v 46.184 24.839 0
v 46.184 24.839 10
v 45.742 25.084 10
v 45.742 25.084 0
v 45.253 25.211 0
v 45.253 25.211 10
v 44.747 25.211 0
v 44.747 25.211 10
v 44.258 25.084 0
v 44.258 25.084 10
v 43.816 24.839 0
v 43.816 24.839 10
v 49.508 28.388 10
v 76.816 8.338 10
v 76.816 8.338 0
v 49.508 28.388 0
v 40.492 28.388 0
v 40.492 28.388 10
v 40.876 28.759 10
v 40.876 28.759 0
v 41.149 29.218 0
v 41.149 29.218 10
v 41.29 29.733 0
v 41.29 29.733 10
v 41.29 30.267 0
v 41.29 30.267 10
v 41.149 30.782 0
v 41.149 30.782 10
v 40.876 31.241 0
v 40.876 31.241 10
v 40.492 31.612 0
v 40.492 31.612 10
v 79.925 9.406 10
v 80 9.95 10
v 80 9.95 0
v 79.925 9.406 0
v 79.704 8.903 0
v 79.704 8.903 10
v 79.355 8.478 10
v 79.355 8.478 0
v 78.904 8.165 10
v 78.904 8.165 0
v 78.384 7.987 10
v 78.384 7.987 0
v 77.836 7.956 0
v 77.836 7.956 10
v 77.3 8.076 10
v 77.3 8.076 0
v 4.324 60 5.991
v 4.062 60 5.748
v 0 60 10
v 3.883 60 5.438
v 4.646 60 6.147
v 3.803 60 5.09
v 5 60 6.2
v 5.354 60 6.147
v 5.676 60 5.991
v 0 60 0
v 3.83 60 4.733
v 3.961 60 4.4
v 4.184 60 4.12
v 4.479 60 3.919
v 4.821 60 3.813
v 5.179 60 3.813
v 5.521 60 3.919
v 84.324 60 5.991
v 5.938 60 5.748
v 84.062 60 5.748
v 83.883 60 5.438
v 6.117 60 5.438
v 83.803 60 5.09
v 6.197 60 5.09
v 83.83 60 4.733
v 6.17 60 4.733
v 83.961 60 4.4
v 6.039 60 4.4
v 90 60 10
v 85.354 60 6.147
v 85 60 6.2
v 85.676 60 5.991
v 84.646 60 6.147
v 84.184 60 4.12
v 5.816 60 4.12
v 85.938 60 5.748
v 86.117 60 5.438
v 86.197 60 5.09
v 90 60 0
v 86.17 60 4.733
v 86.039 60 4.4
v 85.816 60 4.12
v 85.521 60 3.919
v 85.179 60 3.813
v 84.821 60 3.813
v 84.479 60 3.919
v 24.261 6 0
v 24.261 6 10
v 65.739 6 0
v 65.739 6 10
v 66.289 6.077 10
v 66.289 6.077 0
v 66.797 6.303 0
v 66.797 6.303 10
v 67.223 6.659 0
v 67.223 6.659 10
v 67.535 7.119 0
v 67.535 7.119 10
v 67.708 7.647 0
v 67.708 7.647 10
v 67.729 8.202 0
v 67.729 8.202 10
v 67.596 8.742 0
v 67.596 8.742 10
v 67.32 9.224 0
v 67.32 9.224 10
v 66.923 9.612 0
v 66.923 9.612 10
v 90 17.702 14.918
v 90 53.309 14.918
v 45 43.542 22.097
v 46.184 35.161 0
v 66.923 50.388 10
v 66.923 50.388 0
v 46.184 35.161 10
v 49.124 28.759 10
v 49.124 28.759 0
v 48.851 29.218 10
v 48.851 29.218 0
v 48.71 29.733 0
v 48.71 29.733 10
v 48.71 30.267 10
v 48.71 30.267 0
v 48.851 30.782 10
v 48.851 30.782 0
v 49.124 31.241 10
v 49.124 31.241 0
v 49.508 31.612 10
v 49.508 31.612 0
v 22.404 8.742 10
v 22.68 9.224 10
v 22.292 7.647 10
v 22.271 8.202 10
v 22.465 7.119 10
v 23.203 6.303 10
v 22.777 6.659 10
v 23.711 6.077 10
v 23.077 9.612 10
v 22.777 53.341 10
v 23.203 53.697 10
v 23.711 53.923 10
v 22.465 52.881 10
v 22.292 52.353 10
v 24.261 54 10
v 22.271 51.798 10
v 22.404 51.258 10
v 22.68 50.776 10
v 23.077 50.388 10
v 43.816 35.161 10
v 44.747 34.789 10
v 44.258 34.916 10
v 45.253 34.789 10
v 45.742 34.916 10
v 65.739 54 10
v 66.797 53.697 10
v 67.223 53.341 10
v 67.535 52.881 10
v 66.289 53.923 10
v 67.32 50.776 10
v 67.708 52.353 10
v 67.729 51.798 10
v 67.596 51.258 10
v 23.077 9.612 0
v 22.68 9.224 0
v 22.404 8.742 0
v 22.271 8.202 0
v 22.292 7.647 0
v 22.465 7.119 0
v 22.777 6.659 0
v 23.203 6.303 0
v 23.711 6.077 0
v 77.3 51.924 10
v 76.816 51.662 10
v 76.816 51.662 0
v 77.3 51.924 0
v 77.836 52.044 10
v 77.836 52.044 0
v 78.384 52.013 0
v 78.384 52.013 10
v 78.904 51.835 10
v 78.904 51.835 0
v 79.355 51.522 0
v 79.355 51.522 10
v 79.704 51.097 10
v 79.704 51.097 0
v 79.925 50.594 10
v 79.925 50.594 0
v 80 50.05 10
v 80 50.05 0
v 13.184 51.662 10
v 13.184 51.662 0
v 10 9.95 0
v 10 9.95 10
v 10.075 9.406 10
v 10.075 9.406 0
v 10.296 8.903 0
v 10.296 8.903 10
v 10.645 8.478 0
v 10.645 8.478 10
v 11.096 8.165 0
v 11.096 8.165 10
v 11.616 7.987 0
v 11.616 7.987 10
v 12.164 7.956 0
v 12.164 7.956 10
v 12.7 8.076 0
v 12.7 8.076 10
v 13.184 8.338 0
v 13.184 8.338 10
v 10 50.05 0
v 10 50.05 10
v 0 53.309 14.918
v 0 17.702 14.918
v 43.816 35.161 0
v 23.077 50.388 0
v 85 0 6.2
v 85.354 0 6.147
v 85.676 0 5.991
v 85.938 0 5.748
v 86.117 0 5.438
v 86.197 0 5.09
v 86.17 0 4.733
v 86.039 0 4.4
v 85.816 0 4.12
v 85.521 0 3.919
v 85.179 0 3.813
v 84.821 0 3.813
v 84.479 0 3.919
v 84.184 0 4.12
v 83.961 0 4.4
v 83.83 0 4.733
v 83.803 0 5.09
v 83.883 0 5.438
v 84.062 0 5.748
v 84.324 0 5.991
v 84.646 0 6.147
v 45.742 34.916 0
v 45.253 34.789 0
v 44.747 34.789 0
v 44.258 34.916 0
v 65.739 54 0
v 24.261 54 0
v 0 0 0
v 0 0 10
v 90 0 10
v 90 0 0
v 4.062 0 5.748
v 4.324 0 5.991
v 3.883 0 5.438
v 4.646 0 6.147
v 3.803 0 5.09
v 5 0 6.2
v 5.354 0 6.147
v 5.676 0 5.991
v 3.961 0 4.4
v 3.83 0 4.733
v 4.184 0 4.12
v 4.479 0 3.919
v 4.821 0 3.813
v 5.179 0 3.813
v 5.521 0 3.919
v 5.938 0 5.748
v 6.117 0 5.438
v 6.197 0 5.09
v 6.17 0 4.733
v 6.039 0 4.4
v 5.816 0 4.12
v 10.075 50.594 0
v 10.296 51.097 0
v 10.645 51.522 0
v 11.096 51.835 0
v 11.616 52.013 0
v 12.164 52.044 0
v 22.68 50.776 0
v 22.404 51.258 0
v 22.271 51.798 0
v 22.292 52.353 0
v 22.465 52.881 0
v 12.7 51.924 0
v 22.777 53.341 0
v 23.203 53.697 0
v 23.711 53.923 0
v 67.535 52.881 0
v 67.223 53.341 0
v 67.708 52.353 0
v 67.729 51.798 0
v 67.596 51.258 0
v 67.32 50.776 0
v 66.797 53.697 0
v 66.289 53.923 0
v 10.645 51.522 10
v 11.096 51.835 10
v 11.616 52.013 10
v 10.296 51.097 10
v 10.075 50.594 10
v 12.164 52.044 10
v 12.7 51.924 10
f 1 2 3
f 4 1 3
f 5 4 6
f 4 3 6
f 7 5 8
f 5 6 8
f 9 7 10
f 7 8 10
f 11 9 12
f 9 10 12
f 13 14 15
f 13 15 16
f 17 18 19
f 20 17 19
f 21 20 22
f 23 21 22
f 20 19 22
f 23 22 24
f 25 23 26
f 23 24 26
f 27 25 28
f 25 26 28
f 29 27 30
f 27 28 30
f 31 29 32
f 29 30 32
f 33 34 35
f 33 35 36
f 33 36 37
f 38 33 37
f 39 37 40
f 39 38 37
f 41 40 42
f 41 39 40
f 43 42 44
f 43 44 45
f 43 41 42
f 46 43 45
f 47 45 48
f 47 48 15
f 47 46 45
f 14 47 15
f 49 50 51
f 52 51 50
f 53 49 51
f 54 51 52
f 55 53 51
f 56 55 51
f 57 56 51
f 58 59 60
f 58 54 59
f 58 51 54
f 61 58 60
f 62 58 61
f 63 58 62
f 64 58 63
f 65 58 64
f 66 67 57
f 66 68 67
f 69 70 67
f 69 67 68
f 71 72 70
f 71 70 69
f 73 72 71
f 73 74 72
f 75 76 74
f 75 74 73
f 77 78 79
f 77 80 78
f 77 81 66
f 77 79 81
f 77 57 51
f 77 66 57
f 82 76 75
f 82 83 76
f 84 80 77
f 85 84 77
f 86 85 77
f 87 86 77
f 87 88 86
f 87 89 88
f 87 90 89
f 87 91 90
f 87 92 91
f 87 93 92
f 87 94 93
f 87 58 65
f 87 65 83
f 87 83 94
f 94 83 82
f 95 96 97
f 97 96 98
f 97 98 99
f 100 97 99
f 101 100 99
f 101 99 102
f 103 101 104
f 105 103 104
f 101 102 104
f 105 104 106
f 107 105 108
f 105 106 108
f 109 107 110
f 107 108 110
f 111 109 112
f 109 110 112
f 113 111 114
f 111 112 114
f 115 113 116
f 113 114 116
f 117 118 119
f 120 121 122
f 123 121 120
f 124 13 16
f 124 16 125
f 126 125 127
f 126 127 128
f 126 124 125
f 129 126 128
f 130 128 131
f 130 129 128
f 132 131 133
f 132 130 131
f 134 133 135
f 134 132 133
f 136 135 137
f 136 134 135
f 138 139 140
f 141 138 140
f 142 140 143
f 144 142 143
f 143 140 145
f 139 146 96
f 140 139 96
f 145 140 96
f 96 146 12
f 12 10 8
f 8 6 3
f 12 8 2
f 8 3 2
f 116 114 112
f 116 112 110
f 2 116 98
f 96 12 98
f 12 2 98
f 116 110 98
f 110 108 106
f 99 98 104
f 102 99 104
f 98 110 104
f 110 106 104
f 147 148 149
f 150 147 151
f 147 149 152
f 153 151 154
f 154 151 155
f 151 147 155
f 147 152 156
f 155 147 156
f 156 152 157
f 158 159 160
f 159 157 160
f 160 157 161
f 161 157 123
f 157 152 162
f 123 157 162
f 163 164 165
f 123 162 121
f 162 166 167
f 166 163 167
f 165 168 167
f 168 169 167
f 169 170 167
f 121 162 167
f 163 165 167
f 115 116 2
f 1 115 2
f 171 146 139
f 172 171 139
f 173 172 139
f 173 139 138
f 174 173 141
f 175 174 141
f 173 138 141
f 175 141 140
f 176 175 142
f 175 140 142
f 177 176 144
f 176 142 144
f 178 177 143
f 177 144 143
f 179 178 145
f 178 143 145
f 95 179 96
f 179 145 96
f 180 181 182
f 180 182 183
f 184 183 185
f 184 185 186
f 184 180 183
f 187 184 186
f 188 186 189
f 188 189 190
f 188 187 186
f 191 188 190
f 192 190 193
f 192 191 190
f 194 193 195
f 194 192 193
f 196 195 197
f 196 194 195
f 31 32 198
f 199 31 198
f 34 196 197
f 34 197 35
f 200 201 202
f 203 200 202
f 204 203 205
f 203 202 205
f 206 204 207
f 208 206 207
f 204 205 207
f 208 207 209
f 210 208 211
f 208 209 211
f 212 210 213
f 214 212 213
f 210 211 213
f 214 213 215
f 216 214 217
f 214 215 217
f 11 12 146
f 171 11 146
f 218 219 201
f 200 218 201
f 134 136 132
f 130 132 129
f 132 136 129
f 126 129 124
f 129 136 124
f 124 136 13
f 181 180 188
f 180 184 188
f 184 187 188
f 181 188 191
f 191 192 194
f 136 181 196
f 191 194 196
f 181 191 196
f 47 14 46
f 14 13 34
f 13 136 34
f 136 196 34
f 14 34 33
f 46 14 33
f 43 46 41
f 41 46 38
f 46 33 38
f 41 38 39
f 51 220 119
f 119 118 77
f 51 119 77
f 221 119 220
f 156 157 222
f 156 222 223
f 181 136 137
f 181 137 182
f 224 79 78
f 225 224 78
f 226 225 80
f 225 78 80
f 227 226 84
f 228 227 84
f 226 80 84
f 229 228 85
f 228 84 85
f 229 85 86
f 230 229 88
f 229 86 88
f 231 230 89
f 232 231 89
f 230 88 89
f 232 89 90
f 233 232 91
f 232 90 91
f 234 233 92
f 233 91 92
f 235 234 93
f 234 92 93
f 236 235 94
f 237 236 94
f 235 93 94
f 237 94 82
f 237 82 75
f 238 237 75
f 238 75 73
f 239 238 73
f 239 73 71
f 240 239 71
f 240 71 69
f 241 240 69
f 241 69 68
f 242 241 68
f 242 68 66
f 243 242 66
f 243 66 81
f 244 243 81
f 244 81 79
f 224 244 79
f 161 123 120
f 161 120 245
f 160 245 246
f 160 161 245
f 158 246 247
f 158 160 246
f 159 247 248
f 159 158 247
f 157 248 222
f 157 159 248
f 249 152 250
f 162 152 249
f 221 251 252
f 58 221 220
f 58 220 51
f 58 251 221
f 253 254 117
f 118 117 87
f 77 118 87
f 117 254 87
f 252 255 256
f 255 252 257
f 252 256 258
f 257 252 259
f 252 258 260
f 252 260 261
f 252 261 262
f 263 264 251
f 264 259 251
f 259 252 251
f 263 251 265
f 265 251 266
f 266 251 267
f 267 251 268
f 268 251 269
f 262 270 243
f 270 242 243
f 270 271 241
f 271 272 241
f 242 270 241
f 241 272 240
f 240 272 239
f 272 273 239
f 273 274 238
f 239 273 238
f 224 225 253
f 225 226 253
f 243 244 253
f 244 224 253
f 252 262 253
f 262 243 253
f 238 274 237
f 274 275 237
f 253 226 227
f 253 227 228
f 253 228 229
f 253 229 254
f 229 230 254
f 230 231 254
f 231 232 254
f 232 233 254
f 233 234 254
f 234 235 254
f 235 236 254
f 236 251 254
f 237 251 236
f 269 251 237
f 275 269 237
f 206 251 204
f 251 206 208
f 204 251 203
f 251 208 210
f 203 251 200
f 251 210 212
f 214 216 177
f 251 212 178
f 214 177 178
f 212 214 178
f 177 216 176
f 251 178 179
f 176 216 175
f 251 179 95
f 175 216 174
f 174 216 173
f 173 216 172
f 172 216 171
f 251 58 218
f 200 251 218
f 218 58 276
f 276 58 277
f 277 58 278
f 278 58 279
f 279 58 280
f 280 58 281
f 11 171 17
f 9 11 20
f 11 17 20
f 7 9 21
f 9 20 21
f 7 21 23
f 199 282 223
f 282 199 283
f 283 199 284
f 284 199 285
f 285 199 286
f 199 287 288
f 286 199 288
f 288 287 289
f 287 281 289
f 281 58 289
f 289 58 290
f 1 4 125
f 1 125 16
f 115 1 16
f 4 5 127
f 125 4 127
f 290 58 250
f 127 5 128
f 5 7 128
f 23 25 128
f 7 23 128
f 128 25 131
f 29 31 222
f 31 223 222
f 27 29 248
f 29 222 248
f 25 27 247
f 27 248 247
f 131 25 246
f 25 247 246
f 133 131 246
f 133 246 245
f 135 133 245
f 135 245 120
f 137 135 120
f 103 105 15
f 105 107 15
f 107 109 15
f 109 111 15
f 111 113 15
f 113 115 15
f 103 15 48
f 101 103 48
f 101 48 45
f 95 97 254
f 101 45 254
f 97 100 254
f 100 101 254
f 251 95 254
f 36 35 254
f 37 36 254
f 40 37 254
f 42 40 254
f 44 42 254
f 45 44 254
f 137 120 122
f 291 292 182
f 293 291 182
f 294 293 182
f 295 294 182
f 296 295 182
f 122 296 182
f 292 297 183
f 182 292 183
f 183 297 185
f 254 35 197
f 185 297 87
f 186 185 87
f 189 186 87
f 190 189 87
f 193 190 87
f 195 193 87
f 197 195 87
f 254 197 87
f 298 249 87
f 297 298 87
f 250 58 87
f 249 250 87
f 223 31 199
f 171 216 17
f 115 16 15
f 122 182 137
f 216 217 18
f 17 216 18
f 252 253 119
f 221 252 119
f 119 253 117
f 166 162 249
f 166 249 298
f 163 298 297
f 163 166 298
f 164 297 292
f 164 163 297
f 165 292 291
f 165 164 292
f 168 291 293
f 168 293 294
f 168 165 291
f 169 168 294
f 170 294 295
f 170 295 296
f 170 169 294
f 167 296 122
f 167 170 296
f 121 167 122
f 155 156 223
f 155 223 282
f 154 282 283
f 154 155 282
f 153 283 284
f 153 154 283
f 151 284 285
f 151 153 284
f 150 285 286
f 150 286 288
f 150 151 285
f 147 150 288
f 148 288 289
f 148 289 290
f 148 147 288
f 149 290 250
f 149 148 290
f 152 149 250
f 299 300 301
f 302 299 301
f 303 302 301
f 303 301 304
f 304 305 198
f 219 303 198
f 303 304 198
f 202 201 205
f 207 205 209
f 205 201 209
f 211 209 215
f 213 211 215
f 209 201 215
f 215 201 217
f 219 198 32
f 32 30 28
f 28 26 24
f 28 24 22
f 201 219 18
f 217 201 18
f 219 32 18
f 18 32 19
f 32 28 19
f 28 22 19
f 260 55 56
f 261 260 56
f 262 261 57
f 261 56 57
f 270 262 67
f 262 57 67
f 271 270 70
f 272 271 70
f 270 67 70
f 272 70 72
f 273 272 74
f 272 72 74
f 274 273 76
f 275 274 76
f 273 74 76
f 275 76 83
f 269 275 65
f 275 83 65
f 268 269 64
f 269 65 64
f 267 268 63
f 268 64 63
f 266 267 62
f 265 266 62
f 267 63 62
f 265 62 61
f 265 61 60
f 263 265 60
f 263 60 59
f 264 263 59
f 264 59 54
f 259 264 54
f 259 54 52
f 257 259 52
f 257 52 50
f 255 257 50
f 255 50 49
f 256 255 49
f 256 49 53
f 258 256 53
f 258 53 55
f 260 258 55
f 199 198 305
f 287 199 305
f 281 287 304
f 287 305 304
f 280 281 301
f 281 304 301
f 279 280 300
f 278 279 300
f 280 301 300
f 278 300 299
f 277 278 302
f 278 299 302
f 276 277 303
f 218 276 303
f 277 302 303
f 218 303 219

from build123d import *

# Parameters (mm, degrees)
SKIZZE1_W                       = 90
SKIZZE1_H                       = 60
AUFSATZ_LINEAR_AUSTRAGEN1_DEPTH = 10
SCHNITT_LINEAR_AUSTRAGEN1_DEPTH = 10
SKIZZE3_R                       = 1.2
SCHNITT_LINEAR_AUSTRAGEN2_DEPTH = 68
AUFSATZ_LINEAR_AUSTRAGEN2_DEPTH = 90
SCHNITT_LINEAR_AUSTRAGEN4_DEPTH = 90


with BuildPart() as part:
    # Skizze1 → Aufsatz-Linear austragen1 (new body)
    with BuildSketch(Plane.XY):
        with Locations((45, 30)):
            Rectangle(SKIZZE1_W, SKIZZE1_H)
    extrude(amount=AUFSATZ_LINEAR_AUSTRAGEN1_DEPTH)

    # Skizze2 → Schnitt-Linear austragen1 (cut)
    with BuildSketch(Plane.XY.offset(10)):
        with BuildLine():
            Line((10, 50.05034464), (10, 9.94965536))
            ThreePointArc((10, 9.94965536), (11.096486968, 8.165372815), (13.183664201, 8.337532828))
            Line((13.183664201, 8.337532828), (40.491757454, 28.387877468))
            ThreePointArc((40.491757454, 28.387877468), (41.308093253, 30), (40.491757454, 31.612122532))
            Line((40.491757454, 31.612122532), (13.183664201, 51.662467172))
            ThreePointArc((13.183664201, 51.662467172), (11.096486968, 51.834627185), (10, 50.05034464))
        make_face()
        with BuildLine():
            Line((43.816335799, 35.160742066), (23.07733899, 50.387877468))
            ThreePointArc((23.07733899, 50.387877468), (22.360444711, 52.622798095), (24.261003191, 54))
            Line((24.261003191, 54), (65.738996809, 54))
            ThreePointArc((65.738996809, 54), (67.639555289, 52.622798095), (66.92266101, 50.387877468))
            Line((66.92266101, 50.387877468), (46.183664201, 35.160742066))
            ThreePointArc((46.183664201, 35.160742066), (45, 34.772864599), (43.816335799, 35.160742066))
        make_face()
        with BuildLine():
            Line((24.261003191, 6), (65.738996809, 6))
            ThreePointArc((65.738996809, 6), (67.639555289, 7.377201905), (66.92266101, 9.612122532))
            Line((66.92266101, 9.612122532), (46.183664201, 24.839257934))
            ThreePointArc((46.183664201, 24.839257934), (45, 25.227135401), (43.816335799, 24.839257934))
            Line((43.816335799, 24.839257934), (23.07733899, 9.612122532))
            ThreePointArc((23.07733899, 9.612122532), (22.360444711, 7.377201905), (24.261003191, 6))
        make_face()
        with BuildLine():
            Line((80, 50.05034464), (80, 9.94965536))
            ThreePointArc((80, 9.94965536), (78.903513032, 8.165372815), (76.816335799, 8.337532828))
            Line((76.816335799, 8.337532828), (49.508242546, 28.387877468))
            ThreePointArc((49.508242546, 28.387877468), (48.691906747, 30), (49.508242546, 31.612122532))
            Line((49.508242546, 31.612122532), (76.816335799, 51.662467172))
            ThreePointArc((76.816335799, 51.662467172), (78.903513032, 51.834627185), (80, 50.05034464))
        make_face()
    extrude(amount=-SCHNITT_LINEAR_AUSTRAGEN1_DEPTH, mode=Mode.SUBTRACT)

    # Skizze3 → Schnitt-Linear austragen2 (cut)
    with BuildSketch(Plane(origin=(0, 60, 0), x_dir=(1, 0, 0), z_dir=(0, 1, 0))):
        with Locations(Location((5, -5, 0), (0, 0, 270))):
            Circle(SKIZZE3_R)
        with Locations(Location((85, -5, 0), (0, 0, 270))):
            Circle(SKIZZE3_R)
    extrude(amount=-SCHNITT_LINEAR_AUSTRAGEN2_DEPTH, mode=Mode.SUBTRACT)

    # Skizze4 → Aufsatz-Linear austragen2 (add)
    with BuildSketch(Plane(origin=(90, 0, 0), x_dir=(0, 0, -1), z_dir=(1, 0, 0))):
        Polygon((-10, 60), (-10, 0), (-22.096946665, 43.542338596), align=None)
    extrude(amount=-AUFSATZ_LINEAR_AUSTRAGEN2_DEPTH)

    # Skizze5 → Schnitt-Linear austragen4 (cut)
    with BuildSketch(Plane(origin=(0, 60, 0), x_dir=(1, 0, 0), z_dir=(0, 1, 0))):
        Polygon((90, -14.917881766), (45, -22.096946665), (90, -22.096946665), align=None)
        Polygon((45, -22.096946665), (0, -14.917881766), (0, -22.096946665), align=None)
    extrude(amount=-SCHNITT_LINEAR_AUSTRAGEN4_DEPTH, mode=Mode.SUBTRACT)


solid = part.part
